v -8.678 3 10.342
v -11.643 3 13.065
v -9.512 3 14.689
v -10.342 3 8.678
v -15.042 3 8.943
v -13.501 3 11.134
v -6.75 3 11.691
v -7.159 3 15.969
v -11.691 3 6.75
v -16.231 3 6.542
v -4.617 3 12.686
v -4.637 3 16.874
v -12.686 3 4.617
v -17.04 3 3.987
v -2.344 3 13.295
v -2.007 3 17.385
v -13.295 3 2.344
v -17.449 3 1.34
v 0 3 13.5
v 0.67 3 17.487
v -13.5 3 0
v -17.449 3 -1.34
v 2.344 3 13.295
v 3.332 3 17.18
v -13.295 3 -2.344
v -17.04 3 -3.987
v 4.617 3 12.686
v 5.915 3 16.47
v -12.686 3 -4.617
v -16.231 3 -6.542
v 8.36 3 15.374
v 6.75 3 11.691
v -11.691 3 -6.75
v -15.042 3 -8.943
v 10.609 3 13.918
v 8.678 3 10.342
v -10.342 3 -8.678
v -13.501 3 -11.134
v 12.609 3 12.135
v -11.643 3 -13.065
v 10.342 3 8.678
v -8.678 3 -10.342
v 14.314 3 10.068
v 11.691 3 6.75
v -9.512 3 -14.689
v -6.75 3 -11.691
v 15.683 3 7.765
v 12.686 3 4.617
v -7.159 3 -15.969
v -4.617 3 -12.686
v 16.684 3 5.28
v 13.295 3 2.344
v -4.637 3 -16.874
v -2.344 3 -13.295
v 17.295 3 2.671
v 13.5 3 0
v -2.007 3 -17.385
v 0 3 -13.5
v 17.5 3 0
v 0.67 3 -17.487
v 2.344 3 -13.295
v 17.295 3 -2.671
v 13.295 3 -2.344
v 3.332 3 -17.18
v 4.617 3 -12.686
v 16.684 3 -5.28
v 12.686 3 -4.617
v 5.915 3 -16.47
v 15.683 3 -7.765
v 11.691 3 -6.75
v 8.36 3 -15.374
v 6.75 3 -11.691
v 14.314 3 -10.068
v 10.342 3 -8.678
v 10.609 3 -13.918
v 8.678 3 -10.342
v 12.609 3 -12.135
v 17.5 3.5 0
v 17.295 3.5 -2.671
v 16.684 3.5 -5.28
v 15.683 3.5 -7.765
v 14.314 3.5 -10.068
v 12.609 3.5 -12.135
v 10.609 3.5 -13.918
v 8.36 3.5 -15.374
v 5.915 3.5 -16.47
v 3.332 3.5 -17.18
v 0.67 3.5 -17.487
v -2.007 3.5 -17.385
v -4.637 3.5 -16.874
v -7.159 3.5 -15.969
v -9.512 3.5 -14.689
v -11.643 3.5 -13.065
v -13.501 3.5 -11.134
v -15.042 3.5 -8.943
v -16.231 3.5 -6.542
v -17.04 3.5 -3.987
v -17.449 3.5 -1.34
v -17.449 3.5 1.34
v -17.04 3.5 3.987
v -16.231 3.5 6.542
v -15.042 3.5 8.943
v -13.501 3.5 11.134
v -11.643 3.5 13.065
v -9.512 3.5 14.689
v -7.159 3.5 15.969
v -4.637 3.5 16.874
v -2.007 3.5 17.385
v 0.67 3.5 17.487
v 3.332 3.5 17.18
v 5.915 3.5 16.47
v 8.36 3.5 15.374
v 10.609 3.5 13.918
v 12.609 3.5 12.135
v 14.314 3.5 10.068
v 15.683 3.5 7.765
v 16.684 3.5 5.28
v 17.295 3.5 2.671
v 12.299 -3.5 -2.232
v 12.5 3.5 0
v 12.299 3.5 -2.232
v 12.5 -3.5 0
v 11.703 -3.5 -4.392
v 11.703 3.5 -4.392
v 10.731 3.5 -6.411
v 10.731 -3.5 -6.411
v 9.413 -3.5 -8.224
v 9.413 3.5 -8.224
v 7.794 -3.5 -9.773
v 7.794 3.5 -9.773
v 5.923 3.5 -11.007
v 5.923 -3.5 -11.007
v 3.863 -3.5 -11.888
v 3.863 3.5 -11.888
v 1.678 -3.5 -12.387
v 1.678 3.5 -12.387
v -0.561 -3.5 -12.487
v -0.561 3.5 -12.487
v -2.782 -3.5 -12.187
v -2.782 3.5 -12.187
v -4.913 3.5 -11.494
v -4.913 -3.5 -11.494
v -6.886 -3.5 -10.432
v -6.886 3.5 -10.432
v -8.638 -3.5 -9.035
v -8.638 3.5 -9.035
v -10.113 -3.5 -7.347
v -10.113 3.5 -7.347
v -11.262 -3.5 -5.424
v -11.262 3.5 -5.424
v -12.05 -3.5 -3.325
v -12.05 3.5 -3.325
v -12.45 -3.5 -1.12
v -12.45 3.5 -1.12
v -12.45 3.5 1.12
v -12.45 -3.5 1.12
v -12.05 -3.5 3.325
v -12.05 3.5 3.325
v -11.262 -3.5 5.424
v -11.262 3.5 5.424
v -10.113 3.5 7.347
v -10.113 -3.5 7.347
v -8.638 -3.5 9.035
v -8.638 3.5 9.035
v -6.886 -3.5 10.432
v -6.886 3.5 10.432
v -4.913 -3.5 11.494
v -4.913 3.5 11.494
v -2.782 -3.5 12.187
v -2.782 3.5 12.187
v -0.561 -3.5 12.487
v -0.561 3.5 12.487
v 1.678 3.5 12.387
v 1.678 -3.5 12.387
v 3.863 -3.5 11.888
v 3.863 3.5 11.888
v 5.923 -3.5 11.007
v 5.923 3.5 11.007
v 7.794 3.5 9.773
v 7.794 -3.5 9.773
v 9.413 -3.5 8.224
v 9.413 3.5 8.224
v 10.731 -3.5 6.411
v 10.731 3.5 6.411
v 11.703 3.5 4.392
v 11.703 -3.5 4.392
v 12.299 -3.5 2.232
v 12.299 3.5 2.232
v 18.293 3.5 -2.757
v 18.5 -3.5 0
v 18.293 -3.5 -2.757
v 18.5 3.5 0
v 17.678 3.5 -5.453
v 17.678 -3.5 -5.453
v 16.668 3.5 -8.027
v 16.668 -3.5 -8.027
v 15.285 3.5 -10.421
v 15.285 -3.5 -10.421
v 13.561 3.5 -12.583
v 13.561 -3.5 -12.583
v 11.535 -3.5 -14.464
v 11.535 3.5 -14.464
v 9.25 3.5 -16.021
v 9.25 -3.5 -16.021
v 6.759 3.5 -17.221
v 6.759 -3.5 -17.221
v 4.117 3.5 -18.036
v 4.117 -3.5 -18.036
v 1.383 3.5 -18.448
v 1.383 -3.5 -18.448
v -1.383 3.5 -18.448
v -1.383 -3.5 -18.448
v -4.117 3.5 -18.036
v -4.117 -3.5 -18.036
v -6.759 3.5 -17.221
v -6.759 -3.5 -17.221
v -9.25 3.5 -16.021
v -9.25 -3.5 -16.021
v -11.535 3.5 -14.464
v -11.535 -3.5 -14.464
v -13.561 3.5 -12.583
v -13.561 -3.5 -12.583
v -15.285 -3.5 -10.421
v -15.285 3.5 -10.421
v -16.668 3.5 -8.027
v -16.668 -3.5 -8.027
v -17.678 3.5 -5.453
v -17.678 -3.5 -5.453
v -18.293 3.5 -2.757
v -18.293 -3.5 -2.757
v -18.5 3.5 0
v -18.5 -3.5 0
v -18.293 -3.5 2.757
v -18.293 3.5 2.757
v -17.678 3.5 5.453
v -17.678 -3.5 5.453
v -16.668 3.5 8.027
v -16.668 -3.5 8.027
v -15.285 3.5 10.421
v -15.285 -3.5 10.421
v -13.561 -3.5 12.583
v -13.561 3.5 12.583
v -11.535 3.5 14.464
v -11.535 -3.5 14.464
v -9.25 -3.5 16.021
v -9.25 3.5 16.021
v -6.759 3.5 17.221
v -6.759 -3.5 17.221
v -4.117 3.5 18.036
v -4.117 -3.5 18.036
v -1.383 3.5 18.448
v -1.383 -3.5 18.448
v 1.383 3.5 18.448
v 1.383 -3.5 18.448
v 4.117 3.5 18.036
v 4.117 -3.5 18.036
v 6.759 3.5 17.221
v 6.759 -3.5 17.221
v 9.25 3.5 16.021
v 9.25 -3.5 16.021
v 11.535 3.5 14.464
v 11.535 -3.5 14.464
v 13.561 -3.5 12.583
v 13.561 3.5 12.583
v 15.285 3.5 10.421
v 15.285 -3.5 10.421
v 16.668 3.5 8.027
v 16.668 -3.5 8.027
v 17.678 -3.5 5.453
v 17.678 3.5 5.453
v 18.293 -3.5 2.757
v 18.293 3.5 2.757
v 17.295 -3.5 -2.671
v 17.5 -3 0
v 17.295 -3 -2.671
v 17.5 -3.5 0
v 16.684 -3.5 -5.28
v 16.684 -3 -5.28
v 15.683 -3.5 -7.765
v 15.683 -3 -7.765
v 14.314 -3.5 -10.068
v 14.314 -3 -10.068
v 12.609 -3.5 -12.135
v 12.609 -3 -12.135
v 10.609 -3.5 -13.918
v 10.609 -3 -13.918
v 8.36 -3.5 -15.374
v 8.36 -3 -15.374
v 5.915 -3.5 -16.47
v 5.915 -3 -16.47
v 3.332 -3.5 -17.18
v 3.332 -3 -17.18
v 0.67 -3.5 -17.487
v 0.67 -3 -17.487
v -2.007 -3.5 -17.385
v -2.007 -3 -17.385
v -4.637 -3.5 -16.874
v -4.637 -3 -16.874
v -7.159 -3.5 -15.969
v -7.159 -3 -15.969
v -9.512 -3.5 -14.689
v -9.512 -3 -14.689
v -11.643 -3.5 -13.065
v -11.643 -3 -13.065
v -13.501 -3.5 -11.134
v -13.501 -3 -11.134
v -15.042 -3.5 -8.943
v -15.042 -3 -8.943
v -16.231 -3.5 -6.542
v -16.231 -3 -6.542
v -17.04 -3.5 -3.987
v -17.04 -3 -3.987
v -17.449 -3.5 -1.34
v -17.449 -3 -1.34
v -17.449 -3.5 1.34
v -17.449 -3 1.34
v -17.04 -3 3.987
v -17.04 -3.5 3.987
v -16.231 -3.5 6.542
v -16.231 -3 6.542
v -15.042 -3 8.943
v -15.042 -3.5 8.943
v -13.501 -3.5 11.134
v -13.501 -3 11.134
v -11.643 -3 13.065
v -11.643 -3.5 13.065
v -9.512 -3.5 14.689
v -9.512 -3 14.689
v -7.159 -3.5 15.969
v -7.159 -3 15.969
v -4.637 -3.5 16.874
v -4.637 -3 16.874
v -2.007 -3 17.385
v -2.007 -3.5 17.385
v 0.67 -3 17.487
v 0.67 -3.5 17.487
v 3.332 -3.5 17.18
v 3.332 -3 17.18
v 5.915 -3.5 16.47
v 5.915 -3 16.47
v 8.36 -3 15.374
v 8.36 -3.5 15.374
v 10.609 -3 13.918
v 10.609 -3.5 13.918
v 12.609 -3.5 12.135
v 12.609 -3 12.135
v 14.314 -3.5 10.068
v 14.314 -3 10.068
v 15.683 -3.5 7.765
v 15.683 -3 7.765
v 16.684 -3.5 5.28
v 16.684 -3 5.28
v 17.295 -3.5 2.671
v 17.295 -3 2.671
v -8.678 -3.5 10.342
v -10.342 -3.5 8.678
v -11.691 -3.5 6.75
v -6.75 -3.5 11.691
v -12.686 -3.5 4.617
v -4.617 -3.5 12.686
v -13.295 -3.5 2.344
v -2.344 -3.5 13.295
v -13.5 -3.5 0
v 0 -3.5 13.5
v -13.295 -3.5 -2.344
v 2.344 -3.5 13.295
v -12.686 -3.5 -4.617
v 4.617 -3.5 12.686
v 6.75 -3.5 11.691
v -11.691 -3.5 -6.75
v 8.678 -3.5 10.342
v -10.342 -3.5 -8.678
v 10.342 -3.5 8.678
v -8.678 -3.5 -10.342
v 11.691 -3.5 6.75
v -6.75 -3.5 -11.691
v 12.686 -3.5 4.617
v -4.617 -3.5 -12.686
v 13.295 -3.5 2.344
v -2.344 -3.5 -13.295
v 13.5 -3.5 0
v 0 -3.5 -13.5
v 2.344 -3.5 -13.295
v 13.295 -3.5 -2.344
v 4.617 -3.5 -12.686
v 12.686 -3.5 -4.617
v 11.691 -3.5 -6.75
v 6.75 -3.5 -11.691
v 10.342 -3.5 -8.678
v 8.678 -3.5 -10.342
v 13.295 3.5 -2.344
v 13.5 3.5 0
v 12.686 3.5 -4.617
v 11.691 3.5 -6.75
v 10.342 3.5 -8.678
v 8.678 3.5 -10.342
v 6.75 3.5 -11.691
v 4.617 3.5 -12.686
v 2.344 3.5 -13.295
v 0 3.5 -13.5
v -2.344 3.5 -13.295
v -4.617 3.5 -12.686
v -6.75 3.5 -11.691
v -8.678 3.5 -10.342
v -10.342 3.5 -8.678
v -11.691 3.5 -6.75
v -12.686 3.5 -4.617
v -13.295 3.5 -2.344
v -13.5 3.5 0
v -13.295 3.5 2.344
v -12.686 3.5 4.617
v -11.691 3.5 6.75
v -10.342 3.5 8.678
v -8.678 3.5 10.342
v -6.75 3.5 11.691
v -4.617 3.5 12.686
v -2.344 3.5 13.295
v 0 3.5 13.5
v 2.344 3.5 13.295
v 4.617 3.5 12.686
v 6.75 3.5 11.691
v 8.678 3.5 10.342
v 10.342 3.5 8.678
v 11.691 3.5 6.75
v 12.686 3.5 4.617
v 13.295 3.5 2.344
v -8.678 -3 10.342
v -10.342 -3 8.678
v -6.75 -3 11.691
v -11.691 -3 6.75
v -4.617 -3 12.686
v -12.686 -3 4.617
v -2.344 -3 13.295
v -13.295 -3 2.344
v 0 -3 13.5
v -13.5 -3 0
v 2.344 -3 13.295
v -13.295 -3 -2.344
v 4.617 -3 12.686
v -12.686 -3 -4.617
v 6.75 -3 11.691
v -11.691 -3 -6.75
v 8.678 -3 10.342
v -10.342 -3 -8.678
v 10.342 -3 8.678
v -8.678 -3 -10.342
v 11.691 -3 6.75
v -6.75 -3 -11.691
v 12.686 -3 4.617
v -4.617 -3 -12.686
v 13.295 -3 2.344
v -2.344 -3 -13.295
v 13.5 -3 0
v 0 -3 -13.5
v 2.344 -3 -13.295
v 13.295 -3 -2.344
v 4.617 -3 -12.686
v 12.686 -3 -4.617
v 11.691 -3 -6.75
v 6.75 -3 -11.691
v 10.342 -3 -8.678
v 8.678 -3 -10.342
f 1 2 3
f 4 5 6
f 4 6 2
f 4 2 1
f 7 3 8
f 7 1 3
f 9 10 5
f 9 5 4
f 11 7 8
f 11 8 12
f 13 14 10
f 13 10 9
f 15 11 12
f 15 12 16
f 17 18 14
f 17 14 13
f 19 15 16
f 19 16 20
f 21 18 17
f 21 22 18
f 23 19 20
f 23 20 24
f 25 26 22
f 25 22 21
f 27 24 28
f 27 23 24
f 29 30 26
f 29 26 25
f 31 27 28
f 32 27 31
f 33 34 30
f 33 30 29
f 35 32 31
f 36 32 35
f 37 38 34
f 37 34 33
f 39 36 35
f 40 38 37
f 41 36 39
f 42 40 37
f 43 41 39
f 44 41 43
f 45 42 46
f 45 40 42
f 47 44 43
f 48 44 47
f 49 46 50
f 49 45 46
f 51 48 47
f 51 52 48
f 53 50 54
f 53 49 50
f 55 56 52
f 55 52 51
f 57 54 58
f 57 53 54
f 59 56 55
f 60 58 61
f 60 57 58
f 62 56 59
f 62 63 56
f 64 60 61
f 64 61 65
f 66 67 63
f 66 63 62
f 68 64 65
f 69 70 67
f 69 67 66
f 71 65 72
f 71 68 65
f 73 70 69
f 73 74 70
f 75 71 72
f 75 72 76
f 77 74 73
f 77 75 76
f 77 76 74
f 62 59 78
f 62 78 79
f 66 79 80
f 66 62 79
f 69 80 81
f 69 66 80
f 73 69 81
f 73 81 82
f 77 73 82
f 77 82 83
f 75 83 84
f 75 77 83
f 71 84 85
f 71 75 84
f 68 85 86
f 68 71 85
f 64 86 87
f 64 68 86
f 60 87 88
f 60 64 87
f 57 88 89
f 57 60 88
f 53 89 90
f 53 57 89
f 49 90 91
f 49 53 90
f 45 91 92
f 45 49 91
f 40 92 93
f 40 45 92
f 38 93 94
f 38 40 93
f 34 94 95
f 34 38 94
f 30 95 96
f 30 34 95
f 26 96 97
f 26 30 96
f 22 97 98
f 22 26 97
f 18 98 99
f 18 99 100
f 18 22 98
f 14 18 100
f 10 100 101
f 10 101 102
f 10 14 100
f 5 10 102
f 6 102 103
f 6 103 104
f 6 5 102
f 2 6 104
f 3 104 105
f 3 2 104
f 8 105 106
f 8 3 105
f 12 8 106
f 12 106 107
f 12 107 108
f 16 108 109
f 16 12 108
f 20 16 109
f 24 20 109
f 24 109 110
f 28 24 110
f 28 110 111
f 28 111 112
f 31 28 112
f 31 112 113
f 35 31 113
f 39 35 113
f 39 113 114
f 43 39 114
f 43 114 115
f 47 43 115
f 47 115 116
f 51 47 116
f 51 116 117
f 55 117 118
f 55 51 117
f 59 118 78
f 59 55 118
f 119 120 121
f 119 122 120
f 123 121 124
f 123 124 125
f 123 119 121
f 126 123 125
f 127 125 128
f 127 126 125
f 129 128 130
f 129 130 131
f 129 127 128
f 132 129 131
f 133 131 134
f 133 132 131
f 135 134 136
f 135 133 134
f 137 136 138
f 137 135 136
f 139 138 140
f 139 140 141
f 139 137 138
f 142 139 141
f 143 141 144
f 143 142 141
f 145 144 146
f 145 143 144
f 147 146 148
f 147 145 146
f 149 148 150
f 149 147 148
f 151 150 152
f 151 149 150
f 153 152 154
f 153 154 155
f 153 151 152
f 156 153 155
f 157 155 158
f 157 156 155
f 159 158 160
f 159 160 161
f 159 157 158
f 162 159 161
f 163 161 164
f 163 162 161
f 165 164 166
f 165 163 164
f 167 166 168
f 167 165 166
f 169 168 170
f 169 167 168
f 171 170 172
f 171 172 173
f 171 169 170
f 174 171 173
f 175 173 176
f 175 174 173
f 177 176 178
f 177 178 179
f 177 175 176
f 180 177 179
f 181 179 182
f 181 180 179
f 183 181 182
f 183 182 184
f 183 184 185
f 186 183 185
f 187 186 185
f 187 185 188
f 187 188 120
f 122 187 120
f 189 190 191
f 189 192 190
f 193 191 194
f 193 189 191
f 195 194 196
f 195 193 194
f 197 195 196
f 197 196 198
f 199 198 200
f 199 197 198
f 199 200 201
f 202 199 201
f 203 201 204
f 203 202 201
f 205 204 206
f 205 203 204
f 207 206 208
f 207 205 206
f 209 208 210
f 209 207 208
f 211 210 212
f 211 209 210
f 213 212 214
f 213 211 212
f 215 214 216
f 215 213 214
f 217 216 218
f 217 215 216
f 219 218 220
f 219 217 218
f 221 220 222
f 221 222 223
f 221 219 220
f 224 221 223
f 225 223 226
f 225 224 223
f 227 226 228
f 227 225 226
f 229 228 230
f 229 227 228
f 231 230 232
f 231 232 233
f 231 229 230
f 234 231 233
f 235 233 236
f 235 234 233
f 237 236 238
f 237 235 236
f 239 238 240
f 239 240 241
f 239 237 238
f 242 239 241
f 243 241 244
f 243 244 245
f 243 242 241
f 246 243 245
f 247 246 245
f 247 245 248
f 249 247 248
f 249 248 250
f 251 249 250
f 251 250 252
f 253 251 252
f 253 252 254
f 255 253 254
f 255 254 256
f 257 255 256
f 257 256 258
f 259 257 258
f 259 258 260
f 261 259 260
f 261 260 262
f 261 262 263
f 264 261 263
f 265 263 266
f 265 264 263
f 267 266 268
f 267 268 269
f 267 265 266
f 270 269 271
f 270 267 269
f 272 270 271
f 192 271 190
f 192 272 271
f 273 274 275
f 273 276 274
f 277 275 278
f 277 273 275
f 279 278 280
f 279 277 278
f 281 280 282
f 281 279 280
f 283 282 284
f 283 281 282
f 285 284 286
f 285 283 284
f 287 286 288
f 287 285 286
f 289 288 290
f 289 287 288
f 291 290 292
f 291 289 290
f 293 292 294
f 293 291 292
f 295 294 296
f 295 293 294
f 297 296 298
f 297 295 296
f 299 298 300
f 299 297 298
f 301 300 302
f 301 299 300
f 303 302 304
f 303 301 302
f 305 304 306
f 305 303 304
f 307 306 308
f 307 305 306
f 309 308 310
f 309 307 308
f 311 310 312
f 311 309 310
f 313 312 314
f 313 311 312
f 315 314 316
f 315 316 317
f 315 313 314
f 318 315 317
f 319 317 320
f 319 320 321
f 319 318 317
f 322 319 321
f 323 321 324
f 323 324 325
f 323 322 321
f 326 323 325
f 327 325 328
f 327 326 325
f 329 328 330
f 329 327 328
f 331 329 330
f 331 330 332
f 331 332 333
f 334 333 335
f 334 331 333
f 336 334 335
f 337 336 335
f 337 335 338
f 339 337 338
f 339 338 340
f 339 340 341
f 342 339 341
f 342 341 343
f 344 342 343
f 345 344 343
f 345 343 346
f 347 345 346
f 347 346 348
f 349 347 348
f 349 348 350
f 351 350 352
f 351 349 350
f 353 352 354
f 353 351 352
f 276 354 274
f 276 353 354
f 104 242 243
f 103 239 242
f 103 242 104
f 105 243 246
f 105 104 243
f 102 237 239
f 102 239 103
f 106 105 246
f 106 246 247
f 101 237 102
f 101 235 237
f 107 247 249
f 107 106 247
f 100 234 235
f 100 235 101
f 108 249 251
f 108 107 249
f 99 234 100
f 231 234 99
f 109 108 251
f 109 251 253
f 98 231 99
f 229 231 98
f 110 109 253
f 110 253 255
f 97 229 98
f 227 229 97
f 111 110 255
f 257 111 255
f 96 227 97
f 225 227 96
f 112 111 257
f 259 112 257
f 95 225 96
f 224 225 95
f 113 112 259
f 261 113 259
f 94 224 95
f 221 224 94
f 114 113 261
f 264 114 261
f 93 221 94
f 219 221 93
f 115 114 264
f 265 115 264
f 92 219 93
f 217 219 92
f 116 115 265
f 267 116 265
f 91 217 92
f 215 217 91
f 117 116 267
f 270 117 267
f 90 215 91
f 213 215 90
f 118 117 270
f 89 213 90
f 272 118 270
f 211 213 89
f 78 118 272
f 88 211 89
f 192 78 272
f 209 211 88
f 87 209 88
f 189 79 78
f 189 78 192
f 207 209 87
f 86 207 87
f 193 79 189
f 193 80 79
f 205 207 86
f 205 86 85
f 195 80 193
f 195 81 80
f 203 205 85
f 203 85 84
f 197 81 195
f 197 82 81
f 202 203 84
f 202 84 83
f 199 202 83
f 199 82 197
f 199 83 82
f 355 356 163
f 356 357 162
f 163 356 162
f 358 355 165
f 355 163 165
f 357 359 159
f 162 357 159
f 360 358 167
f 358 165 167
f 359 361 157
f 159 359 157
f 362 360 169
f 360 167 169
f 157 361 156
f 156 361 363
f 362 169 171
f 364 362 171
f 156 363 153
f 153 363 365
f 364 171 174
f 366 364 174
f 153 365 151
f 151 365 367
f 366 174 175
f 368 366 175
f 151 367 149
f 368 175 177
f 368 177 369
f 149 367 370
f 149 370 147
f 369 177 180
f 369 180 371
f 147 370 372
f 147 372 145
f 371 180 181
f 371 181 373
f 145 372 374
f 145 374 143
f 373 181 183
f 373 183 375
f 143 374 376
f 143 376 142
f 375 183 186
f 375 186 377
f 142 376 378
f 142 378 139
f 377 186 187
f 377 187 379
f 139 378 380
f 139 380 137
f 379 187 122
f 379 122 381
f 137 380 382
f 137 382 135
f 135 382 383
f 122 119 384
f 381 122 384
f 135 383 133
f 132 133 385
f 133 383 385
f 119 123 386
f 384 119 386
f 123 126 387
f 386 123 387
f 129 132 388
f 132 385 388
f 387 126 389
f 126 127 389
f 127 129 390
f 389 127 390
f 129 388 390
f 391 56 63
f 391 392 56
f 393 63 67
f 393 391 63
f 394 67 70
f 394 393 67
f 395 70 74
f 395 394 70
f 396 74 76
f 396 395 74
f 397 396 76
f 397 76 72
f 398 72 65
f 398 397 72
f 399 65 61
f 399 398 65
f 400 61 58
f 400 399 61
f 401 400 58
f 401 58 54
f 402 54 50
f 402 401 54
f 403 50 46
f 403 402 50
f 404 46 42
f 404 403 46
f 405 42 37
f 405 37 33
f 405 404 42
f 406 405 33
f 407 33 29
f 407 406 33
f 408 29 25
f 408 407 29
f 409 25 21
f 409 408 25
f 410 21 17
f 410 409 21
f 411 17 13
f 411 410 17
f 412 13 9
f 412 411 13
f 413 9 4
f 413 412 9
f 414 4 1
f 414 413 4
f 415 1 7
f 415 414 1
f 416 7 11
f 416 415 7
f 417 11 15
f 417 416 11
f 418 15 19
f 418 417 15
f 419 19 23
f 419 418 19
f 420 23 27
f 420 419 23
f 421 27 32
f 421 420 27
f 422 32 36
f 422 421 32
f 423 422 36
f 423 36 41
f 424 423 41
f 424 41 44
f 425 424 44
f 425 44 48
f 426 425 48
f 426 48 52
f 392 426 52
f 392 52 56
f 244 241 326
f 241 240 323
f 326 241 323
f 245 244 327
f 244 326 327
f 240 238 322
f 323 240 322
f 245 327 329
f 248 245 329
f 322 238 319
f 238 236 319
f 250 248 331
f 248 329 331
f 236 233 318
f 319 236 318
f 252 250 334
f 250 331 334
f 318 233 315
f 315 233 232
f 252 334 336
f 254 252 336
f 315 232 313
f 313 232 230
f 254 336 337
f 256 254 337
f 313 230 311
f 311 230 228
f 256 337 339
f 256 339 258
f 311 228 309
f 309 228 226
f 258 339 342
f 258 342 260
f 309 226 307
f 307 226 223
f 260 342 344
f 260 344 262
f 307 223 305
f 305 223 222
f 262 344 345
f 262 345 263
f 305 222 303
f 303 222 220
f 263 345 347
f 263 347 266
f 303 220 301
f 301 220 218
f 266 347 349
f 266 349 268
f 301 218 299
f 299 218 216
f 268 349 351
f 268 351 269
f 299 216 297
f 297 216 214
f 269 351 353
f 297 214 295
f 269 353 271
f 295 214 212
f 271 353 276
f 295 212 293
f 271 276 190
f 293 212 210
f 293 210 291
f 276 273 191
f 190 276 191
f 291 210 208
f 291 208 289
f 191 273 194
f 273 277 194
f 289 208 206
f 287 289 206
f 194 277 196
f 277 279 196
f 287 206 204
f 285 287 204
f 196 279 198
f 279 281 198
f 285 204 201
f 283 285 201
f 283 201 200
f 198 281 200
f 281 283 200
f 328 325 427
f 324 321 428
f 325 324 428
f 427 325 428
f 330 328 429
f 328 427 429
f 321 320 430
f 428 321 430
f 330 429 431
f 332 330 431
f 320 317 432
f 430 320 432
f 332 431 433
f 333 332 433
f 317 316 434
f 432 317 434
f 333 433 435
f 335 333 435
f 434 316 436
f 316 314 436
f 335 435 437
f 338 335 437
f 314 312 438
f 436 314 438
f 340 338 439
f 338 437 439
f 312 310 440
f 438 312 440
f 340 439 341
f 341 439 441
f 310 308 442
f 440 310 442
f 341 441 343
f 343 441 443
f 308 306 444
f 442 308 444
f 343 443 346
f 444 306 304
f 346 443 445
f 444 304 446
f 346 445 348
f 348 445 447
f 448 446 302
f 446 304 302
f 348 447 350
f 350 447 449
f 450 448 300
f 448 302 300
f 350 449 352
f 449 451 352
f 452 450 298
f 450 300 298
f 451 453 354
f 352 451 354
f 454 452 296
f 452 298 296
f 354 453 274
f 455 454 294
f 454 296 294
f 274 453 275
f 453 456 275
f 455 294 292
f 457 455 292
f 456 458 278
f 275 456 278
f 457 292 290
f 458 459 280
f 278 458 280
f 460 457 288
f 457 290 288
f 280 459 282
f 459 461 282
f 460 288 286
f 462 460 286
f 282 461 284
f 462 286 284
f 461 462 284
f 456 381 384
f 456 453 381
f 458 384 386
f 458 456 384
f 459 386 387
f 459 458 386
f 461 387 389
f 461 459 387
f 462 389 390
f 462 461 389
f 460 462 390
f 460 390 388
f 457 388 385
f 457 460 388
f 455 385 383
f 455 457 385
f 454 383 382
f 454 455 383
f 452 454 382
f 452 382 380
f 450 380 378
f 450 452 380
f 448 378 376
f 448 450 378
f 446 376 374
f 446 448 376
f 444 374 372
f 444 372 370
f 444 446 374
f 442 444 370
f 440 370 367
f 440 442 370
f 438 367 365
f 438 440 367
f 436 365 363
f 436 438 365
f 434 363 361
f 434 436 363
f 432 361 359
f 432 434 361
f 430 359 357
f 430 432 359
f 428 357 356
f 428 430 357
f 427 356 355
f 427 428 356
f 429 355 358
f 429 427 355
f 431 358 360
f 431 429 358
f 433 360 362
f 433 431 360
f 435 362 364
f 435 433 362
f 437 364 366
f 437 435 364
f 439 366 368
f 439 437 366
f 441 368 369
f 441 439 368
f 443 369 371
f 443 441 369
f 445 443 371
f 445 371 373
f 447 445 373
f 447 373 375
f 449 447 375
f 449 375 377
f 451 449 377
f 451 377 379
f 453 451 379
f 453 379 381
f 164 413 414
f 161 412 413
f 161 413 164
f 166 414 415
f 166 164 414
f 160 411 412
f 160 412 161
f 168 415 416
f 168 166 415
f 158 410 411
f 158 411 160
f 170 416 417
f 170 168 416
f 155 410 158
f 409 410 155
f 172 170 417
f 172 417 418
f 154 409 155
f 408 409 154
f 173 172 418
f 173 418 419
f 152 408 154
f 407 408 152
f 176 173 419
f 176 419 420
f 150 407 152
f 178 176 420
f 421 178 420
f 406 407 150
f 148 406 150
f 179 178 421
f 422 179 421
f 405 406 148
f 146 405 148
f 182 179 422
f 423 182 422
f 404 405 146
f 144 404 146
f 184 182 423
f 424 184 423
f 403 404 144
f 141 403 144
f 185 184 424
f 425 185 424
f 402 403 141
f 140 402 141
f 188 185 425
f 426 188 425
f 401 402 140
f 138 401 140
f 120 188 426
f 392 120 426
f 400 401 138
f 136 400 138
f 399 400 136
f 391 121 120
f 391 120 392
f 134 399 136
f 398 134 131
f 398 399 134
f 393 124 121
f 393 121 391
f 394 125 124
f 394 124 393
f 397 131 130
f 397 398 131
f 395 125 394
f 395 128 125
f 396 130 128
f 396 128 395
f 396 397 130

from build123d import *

# Parameters (mm, degrees)
EXTRUDE_1_DEPTH        = 3.5
EXTRUDE_1_DEPTH_BACK   = 3.5
SKETCH_1_R             = 13.5
SKETCH_1_R_2           = 12.5
EXTRUDE_1_2_DEPTH      = 3.5
EXTRUDE_1_2_DEPTH_BACK = 3.5
SKETCH_1_R_3           = 18.5
SKETCH_1_R_4           = 17.5
EXTRUDE_2_DEPTH        = 3
EXTRUDE_2_DEPTH_BACK   = 3
SKETCH_2_R             = 17.5
SKETCH_2_R_2           = 13.5


with BuildPart() as part:
    # 草图1 → 凸台-拉伸1 (new, two sides: drawn at the far end of the back side and taken through both)
    with BuildSketch(Plane(origin=(0, 0, 0), x_dir=(1, 0, 0), z_dir=(0, 1, 0)).offset(-EXTRUDE_1_DEPTH_BACK)):
        Circle(SKETCH_1_R)
        Circle(SKETCH_1_R_2, mode=Mode.SUBTRACT)
    extrude(amount=EXTRUDE_1_DEPTH + EXTRUDE_1_DEPTH_BACK)



with BuildPart() as body_2:
    # 草图1 → Extrude 1 2 (new, two sides: drawn at the far end of the back side and taken through both)
    with BuildSketch(Plane(origin=(0, 0, 0), x_dir=(1, 0, 0), z_dir=(0, 1, 0)).offset(-EXTRUDE_1_2_DEPTH_BACK)):
        Circle(SKETCH_1_R_3)
        Circle(SKETCH_1_R_4, mode=Mode.SUBTRACT)
    extrude(amount=EXTRUDE_1_2_DEPTH + EXTRUDE_1_2_DEPTH_BACK)


with BuildPart() as part_1:
    add(part.part)

    add(body_2.part)  # 凸台-拉伸2 merges body 2
    # 草图2 → 凸台-拉伸2 (add, two sides: drawn at the far end of the back side and taken through both)
    with BuildSketch(Plane(origin=(0, 0, 0), x_dir=(1, 0, 0), z_dir=(0, 1, 0)).offset(-EXTRUDE_2_DEPTH_BACK)):
        Circle(SKETCH_2_R)
        Circle(SKETCH_2_R_2, mode=Mode.SUBTRACT)
    extrude(amount=EXTRUDE_2_DEPTH + EXTRUDE_2_DEPTH_BACK)


solid = part_1.part
